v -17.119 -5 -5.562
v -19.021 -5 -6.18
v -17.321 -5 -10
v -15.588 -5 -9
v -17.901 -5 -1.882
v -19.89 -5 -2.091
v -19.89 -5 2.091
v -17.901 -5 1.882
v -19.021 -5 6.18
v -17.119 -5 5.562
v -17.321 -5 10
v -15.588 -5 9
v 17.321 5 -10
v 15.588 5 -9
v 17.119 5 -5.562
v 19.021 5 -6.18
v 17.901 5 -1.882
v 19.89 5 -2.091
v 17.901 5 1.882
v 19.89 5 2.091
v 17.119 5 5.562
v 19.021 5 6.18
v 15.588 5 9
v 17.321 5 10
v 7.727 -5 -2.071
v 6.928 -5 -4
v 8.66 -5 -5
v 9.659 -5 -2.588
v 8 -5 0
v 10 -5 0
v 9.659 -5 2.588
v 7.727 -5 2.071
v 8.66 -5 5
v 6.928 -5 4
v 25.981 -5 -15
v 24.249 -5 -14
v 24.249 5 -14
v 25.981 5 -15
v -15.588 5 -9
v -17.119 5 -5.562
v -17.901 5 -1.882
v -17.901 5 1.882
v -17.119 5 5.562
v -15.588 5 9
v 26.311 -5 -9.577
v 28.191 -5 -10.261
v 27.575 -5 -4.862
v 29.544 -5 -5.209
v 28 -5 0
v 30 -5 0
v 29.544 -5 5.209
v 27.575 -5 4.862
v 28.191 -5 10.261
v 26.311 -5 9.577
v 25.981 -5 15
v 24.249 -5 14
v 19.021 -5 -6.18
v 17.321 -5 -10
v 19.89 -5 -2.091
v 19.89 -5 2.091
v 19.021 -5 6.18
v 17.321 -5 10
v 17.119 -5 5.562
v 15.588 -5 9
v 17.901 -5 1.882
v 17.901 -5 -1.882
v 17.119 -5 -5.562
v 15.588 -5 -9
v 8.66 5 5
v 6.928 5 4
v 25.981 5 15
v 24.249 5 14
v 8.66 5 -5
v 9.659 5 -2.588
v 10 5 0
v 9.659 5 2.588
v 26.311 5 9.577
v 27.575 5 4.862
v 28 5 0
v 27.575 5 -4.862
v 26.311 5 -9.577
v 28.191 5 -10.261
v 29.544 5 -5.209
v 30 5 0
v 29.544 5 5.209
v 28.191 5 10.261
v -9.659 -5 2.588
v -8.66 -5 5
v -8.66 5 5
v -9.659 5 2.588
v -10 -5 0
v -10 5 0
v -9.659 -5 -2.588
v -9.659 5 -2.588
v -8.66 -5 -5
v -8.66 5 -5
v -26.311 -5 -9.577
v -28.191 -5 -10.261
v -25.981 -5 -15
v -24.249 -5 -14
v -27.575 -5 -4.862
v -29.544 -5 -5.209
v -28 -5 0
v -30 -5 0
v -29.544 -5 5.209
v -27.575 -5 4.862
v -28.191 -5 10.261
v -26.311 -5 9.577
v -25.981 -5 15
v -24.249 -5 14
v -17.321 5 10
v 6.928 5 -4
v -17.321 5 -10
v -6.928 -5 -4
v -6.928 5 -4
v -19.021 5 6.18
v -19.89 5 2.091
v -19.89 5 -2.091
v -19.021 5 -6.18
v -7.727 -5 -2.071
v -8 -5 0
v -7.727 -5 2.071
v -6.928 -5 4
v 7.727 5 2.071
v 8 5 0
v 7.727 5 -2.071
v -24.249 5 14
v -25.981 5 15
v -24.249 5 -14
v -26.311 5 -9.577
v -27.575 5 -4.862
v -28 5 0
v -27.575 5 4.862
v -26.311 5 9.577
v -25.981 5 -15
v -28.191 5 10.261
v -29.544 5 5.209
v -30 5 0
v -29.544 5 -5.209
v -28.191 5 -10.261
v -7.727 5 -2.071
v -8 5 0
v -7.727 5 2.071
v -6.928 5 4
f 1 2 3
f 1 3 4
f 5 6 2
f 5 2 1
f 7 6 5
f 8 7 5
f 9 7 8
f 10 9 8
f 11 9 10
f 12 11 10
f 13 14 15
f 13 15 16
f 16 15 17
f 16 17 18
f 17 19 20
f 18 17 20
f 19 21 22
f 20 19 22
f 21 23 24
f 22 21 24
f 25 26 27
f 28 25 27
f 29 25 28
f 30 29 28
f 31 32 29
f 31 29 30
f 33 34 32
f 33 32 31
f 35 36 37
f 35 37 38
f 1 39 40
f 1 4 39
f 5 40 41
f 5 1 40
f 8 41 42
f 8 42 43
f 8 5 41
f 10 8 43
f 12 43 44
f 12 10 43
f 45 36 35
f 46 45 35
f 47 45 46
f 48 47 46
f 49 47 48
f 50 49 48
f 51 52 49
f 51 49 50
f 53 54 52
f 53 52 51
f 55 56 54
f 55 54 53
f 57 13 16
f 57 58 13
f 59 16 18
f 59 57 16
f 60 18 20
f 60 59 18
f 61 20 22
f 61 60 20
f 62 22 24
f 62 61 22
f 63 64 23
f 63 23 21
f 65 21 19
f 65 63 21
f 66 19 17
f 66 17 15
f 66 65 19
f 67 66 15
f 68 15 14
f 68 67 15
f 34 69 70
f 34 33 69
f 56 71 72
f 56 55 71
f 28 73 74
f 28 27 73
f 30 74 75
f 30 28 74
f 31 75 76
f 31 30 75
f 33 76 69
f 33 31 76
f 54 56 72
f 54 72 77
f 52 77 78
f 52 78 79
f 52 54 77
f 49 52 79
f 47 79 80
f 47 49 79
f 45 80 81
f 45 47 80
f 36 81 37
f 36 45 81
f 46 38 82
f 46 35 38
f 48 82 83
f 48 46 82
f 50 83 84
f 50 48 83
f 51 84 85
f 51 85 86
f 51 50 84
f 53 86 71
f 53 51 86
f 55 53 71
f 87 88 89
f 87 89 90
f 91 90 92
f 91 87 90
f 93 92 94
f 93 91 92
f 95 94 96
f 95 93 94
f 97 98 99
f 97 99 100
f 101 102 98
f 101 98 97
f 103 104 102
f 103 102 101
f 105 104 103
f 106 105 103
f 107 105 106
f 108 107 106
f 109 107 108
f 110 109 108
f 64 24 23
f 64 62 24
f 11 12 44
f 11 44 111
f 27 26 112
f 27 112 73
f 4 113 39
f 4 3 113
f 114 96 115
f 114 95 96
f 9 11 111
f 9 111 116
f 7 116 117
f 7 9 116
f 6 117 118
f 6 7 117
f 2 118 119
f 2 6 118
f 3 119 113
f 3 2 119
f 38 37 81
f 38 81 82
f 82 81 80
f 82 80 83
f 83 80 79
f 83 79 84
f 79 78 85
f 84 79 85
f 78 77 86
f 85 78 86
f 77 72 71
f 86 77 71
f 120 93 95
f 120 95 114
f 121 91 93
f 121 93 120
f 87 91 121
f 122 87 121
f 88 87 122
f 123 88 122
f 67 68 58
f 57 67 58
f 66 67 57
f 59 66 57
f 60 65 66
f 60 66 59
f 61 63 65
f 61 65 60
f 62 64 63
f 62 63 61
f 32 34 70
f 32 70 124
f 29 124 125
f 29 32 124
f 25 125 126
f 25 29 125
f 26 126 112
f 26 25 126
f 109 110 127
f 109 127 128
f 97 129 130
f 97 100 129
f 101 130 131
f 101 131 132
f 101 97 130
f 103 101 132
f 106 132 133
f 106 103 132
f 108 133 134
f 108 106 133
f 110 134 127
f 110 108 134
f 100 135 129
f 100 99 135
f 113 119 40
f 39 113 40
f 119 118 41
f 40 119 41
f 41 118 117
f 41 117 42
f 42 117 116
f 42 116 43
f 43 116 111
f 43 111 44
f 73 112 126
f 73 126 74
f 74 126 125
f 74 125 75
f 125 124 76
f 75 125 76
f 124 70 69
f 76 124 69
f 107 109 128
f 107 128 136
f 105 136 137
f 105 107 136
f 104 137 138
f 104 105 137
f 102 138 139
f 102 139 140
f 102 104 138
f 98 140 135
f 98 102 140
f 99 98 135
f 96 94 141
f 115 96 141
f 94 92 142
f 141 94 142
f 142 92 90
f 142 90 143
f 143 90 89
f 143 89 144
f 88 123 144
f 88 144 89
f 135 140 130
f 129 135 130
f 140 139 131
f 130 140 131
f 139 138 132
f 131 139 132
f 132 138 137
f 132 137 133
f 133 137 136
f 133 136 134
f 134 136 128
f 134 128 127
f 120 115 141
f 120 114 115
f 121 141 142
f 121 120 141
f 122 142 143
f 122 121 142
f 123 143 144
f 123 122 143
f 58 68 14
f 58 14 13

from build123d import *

# Parameters (mm, degrees)
F1_DEPTH      = 5
F1_DEPTH_BACK = 5


with BuildPart() as f1:
    # F0 (on Front) → F1 (new body, two sides)
    with BuildSketch(Plane.XZ) as f1_sk:
        with BuildLine():
            Line((25.980762, 15), (24.248711, 14))
            ThreePointArc((24.248711, 14), (28, 0), (24.248711, -14))
            Line((24.248711, -14), (25.980762, -15))
            ThreePointArc((25.980762, -15), (30, 0), (25.980762, 15))
        make_face()
        with BuildLine():
            Line((17.320508, 10), (15.588457, 9))
            ThreePointArc((15.588457, 9), (18, 0), (15.588457, -9))
            Line((15.588457, -9), (17.320508, -10))
            ThreePointArc((17.320508, -10), (20, 0), (17.320508, 10))
        make_face()
        with BuildLine():
            Line((8.660254, 5), (6.928203, 4))
            ThreePointArc((6.928203, 4), (8, 0), (6.928203, -4))
            Line((6.928203, -4), (8.660254, -5))
            ThreePointArc((8.660254, -5), (10, 0), (8.660254, 5))
        make_face()
        with BuildLine():
            ThreePointArc((-6.928203, -4), (-8, 0), (-6.928203, 4))
            Line((-6.928203, 4), (-8.660254, 5))
            ThreePointArc((-8.660254, 5), (-10, 0), (-8.660254, -5))
            Line((-8.660254, -5), (-6.928203, -4))
        make_face()
        with BuildLine():
            ThreePointArc((-15.588457, -9), (-18, 0), (-15.588457, 9))
            Line((-15.588457, 9), (-17.320508, 10))
            ThreePointArc((-17.320508, 10), (-20, 0), (-17.320508, -10))
            Line((-17.320508, -10), (-15.588457, -9))
        make_face()
        with BuildLine():
            ThreePointArc((-24.248711, -14), (-28, 0), (-24.248711, 14))
            Line((-24.248711, 14), (-25.980762, 15))
            ThreePointArc((-25.980762, 15), (-30, 0), (-25.980762, -15))
            Line((-25.980762, -15), (-24.248711, -14))
        make_face()
    extrude(amount=F1_DEPTH)
    extrude(f1_sk.sketch, amount=-F1_DEPTH_BACK)


solid = f1.part
